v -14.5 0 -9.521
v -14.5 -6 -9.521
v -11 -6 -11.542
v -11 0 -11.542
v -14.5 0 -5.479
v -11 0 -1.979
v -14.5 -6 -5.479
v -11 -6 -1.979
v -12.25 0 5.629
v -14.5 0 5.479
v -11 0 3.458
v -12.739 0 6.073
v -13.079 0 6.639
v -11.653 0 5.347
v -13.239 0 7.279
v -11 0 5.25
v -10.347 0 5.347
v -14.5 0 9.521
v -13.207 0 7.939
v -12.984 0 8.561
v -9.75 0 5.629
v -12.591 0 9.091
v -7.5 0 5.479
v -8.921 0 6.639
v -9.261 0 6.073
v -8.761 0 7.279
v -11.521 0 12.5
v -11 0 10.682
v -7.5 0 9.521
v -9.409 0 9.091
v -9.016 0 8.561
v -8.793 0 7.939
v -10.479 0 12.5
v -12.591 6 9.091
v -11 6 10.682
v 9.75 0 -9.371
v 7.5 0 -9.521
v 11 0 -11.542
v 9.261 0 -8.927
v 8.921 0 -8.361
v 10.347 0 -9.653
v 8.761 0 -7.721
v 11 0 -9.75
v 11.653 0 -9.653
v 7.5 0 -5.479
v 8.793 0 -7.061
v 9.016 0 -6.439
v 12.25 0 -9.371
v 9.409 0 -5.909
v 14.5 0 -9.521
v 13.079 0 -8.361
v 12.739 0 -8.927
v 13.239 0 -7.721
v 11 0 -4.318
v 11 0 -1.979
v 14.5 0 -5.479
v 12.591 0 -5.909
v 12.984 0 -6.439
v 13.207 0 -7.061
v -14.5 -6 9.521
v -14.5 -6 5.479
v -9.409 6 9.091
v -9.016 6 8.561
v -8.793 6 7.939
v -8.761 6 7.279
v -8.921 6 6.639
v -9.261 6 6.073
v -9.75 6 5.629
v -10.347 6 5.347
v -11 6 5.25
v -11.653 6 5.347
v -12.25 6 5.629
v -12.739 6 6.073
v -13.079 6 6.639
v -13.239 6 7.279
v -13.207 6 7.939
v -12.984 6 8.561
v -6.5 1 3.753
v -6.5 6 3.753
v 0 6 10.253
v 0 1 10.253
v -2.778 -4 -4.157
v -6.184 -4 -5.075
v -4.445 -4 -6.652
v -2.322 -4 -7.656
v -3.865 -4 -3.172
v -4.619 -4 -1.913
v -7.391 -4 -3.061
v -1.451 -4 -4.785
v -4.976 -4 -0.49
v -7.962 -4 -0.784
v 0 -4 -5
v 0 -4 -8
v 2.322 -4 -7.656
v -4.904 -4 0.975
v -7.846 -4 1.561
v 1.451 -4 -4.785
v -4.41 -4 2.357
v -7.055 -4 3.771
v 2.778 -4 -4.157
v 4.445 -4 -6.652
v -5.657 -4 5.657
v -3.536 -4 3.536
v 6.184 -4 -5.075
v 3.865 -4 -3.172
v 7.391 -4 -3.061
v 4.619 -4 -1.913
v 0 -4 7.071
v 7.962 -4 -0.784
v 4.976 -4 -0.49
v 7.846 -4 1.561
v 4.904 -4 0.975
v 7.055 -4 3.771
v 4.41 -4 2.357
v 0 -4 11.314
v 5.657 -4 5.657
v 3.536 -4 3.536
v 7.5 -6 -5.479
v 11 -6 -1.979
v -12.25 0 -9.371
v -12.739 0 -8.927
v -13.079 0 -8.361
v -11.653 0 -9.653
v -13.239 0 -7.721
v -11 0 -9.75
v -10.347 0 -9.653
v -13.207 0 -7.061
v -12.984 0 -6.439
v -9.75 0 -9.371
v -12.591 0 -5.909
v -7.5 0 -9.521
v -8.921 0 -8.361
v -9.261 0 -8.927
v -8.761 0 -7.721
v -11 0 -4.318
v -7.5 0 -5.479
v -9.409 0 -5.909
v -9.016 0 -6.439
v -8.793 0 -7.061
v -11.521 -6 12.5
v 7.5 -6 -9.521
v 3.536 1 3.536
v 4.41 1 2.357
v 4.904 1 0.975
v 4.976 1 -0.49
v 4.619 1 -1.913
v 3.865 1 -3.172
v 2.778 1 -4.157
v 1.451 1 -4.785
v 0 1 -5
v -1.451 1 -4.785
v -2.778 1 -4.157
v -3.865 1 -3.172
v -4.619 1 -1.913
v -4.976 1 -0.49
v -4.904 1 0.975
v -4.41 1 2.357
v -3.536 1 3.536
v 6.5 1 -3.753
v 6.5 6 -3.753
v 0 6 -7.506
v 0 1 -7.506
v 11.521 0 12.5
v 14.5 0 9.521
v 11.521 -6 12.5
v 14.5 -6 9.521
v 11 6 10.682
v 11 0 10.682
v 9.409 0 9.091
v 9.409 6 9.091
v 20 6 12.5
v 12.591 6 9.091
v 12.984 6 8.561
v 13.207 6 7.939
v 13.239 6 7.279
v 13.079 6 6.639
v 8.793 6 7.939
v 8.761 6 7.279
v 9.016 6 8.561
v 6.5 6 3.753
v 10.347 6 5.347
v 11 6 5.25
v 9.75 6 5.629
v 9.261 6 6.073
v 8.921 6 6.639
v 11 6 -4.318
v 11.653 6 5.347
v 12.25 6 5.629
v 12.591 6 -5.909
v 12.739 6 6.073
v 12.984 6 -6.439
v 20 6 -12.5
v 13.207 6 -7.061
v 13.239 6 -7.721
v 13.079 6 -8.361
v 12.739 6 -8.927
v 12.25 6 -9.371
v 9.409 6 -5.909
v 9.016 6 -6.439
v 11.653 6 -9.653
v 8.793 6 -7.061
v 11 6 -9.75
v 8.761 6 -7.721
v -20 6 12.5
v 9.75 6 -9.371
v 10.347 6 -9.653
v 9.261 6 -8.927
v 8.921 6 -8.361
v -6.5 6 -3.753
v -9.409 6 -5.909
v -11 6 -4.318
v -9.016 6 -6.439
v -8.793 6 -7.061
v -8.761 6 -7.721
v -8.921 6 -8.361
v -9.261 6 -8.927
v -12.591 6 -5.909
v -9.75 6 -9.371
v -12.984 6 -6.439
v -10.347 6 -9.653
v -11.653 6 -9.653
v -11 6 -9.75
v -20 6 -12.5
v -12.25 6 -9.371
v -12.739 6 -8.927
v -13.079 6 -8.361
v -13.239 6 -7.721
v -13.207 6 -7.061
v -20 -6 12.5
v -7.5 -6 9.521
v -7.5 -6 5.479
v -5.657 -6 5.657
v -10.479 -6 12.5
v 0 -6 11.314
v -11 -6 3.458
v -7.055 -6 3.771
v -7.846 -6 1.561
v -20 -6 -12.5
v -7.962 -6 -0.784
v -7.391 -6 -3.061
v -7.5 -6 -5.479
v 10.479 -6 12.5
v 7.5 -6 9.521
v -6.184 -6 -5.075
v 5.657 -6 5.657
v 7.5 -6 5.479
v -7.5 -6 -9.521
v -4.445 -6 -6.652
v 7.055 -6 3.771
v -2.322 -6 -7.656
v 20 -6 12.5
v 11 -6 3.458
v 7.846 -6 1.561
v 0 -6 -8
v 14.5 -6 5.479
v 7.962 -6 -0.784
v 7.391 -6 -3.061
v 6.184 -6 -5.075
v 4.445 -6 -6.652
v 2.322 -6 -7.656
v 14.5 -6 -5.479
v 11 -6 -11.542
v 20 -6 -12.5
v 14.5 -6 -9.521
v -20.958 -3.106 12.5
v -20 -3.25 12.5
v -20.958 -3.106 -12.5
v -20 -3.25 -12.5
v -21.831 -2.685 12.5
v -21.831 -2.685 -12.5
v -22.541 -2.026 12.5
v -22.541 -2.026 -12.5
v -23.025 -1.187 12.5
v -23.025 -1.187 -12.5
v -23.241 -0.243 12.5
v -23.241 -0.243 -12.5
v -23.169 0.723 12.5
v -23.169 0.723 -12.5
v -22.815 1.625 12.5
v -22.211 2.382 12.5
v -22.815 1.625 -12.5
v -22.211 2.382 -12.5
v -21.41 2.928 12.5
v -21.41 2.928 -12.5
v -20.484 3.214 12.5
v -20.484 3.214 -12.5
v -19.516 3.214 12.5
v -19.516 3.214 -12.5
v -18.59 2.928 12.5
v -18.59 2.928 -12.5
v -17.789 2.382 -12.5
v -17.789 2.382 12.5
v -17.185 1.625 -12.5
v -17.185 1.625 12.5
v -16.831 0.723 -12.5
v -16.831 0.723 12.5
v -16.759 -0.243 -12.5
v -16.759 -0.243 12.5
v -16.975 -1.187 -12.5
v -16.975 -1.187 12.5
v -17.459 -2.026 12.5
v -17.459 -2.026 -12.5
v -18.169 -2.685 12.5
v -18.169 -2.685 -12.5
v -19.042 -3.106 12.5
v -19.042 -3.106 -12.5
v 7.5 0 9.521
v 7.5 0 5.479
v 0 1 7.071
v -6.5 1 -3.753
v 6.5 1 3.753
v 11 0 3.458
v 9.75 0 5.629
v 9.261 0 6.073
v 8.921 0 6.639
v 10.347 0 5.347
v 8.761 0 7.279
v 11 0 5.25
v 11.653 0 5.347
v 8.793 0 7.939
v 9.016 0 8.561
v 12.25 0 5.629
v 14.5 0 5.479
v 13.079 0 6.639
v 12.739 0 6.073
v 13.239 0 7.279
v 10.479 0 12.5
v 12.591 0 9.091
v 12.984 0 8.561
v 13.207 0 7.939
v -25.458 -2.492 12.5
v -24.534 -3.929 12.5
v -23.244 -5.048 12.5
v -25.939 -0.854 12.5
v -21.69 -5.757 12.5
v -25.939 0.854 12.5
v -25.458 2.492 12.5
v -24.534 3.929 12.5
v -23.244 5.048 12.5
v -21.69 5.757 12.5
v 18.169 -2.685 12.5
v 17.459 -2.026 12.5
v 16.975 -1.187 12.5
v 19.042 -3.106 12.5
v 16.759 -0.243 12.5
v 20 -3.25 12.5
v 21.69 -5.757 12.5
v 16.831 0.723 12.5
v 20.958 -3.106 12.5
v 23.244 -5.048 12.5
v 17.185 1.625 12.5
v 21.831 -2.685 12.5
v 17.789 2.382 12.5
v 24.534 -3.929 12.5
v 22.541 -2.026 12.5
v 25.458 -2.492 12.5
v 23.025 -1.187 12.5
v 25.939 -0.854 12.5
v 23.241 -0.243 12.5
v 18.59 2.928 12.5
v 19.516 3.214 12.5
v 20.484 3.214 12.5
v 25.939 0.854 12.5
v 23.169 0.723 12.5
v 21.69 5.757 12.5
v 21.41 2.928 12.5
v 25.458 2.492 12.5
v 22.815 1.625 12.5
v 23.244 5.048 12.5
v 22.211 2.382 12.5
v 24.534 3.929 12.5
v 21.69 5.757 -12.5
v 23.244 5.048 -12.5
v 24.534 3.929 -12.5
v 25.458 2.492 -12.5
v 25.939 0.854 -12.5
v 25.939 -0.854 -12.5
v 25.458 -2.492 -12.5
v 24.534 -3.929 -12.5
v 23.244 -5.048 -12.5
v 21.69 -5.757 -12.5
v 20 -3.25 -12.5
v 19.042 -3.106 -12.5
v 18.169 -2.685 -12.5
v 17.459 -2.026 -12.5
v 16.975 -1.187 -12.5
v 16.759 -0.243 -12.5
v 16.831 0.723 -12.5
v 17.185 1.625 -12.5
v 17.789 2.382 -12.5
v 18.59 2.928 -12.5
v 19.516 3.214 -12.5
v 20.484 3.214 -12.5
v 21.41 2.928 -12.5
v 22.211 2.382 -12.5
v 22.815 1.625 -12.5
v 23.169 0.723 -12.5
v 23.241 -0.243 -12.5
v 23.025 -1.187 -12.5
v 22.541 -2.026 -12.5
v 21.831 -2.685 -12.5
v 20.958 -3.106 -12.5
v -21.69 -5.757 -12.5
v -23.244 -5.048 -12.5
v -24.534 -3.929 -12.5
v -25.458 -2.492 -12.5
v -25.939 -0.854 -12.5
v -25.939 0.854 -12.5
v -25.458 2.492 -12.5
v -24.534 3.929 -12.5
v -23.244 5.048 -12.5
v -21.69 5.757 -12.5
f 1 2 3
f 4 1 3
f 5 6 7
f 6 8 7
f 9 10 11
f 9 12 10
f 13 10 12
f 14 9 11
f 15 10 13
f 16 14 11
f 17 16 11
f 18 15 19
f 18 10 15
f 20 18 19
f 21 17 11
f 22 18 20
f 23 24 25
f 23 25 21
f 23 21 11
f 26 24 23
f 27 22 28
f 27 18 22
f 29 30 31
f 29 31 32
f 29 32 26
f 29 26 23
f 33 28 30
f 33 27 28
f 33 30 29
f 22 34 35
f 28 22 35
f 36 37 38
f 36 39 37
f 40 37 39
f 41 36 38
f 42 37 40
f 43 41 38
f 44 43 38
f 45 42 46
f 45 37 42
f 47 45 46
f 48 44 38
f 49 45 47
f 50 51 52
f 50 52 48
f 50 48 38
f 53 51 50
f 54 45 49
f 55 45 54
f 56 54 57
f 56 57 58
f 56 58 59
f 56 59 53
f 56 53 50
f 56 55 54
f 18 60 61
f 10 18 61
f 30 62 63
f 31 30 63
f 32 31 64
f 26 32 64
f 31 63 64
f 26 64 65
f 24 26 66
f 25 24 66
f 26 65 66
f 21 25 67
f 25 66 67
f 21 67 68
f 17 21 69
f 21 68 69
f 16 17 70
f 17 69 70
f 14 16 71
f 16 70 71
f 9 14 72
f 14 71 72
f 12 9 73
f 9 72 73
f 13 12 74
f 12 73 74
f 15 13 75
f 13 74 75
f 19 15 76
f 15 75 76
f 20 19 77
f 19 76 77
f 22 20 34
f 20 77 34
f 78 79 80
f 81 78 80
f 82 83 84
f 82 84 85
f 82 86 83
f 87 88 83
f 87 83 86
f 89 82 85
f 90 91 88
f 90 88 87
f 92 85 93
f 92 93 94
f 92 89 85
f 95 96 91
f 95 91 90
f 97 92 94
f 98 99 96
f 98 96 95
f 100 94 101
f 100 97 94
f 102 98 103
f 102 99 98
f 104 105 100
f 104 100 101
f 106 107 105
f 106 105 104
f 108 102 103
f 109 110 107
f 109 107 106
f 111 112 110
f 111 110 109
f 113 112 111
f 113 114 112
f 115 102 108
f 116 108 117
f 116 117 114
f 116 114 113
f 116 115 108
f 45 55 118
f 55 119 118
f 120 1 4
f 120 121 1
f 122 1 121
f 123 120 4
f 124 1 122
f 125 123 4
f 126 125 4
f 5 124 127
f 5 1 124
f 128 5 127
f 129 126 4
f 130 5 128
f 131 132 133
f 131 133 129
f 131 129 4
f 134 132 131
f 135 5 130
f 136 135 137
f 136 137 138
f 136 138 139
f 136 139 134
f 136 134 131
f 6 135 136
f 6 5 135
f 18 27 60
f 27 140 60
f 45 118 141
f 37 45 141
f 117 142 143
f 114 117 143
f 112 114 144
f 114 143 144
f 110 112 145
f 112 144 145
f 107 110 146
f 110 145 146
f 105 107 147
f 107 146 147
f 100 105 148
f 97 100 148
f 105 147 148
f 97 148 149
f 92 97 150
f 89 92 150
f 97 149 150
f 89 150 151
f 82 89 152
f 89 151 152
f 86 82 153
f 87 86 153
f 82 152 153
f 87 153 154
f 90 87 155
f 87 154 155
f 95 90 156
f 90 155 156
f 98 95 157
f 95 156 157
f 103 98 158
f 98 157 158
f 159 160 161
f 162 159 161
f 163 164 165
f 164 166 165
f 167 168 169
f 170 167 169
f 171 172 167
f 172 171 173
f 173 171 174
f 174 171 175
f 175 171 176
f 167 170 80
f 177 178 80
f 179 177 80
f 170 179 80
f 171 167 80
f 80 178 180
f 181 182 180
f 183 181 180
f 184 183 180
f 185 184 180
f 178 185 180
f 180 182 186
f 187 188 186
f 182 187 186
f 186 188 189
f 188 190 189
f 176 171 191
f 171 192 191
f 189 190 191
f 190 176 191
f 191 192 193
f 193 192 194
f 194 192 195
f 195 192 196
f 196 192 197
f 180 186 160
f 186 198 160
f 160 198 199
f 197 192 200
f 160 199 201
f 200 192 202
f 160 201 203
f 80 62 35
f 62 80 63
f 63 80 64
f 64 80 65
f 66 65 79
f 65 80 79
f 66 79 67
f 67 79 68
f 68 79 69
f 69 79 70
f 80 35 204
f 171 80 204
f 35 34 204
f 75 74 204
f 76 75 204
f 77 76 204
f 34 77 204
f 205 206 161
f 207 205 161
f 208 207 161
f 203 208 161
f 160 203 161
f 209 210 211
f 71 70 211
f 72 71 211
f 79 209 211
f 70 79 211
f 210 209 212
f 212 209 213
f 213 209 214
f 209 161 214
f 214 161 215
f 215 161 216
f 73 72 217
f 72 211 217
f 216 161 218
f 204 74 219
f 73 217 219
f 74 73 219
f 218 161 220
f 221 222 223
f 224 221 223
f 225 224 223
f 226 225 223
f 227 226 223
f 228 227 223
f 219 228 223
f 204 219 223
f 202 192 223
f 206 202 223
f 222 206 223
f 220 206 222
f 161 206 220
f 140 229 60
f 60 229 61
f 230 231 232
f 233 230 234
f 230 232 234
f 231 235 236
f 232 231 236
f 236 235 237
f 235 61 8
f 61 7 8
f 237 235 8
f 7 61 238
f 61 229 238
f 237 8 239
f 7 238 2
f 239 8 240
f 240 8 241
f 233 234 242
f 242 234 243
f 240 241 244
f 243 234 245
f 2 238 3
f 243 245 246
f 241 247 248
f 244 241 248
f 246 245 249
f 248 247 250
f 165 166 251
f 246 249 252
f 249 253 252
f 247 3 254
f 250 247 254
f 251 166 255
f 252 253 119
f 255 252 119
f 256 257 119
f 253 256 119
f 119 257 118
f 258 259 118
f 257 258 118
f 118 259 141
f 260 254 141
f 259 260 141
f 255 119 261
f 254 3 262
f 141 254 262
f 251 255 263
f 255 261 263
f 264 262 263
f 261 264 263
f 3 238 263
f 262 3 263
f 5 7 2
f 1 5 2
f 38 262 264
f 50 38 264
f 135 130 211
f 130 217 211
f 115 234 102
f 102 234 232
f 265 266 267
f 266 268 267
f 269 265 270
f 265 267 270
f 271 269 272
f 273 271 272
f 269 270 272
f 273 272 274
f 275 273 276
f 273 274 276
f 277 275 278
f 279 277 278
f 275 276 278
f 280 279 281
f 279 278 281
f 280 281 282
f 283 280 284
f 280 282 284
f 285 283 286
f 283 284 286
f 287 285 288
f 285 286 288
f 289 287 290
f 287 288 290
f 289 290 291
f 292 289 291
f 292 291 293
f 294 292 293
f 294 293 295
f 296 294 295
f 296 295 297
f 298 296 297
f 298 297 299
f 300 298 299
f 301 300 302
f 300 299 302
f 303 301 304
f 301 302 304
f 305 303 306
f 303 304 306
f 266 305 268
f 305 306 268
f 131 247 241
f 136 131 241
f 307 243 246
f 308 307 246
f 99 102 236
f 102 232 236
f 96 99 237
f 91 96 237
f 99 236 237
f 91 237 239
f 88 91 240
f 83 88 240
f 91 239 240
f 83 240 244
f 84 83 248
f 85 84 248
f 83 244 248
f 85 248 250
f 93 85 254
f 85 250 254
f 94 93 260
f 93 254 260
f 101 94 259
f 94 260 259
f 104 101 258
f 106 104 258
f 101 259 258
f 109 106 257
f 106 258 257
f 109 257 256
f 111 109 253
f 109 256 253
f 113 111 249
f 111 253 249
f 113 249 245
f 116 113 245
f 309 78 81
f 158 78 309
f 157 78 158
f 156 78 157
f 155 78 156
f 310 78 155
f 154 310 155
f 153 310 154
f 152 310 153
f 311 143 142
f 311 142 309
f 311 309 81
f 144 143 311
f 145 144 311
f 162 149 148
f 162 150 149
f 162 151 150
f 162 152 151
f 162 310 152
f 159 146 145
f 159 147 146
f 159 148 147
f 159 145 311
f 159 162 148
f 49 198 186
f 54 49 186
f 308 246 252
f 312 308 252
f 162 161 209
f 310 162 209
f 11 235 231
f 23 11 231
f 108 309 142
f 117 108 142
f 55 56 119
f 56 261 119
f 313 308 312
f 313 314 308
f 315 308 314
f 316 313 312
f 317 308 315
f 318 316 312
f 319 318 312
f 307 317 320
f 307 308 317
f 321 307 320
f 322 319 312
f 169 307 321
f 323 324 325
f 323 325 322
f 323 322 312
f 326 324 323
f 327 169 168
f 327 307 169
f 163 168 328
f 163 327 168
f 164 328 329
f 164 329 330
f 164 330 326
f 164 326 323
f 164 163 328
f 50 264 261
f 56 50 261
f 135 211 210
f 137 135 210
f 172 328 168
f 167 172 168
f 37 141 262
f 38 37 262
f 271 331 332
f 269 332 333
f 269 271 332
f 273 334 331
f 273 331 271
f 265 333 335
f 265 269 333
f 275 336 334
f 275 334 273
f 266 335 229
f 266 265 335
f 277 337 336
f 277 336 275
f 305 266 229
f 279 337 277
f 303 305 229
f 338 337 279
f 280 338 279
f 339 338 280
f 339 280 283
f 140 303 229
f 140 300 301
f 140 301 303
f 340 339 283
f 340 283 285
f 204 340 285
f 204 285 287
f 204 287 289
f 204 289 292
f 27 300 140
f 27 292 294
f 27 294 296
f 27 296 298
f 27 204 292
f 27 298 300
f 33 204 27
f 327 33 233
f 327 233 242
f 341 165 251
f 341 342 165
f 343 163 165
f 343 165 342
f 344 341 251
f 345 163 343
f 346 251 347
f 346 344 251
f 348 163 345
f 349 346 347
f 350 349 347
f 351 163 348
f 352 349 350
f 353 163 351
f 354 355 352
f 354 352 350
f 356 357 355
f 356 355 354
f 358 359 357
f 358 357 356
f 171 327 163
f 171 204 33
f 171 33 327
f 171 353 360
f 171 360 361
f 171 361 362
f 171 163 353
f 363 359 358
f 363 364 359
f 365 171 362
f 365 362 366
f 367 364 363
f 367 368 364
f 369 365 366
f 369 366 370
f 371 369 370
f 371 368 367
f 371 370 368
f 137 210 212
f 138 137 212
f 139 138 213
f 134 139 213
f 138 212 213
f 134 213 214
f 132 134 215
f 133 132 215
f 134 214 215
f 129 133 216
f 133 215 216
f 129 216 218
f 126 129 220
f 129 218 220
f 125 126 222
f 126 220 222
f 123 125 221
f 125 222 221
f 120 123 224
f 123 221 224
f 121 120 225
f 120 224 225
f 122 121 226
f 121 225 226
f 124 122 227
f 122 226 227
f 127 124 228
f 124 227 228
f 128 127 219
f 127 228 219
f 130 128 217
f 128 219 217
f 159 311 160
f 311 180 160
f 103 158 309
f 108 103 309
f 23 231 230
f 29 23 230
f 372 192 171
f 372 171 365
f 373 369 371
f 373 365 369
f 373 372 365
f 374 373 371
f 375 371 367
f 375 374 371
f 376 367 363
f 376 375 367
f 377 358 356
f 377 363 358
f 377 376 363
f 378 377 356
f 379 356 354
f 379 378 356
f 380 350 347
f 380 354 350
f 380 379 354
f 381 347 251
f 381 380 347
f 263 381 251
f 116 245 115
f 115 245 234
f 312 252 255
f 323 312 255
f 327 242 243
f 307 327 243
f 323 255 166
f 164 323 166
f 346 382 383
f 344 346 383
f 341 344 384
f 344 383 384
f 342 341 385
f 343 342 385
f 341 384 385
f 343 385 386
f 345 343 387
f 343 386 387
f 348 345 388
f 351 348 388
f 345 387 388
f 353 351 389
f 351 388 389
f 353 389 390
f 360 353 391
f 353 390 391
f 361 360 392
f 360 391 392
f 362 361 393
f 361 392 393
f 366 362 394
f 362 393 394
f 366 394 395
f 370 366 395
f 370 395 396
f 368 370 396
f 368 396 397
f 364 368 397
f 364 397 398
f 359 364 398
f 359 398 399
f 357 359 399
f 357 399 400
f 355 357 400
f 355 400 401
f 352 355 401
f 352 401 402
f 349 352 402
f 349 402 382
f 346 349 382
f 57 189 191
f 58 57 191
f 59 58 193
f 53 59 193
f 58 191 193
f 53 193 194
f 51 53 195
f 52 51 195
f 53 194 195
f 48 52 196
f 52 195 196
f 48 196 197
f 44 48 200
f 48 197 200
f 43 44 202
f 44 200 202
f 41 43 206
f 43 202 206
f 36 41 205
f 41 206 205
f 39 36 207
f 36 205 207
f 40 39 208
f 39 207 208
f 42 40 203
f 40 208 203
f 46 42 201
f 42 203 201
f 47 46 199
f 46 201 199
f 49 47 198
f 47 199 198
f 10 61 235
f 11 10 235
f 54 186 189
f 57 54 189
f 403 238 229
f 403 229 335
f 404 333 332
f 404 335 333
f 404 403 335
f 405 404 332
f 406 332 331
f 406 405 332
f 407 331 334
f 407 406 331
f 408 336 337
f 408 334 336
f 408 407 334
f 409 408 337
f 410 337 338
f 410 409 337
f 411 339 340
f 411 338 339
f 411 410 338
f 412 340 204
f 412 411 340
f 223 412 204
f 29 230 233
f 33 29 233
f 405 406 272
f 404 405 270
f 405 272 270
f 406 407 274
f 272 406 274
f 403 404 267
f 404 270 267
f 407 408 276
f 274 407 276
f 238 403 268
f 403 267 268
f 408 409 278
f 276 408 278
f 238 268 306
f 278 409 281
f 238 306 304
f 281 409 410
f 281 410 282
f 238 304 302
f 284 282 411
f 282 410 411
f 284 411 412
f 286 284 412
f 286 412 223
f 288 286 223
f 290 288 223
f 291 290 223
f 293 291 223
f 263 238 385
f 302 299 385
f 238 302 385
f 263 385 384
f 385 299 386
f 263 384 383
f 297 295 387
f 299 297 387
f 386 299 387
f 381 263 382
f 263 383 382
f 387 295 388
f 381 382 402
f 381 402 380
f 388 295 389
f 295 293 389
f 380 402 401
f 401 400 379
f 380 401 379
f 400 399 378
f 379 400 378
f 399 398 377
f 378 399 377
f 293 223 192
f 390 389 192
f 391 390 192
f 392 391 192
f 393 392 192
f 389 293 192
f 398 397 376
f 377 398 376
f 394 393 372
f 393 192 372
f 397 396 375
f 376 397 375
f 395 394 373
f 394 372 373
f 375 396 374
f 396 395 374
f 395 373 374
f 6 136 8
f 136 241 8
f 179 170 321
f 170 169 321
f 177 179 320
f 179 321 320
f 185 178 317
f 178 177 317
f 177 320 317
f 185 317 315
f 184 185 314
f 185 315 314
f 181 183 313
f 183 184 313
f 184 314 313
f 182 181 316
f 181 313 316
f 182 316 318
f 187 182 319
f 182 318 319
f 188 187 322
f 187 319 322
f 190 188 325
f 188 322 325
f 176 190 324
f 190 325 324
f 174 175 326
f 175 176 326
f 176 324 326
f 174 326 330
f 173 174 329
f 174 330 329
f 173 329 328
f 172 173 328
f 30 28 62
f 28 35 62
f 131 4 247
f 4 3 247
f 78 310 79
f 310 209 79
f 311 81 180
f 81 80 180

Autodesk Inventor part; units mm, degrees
ref_plane "YZ Plane" through (0, 0, 0) normal (1, 0, 0) x (0, 1, 0)
ref_plane "XZ Plane" through (0, 0, 0) normal (0, 1, 0) x (-1, 0, 0)
ref_plane "Work Plane1" through (0, 0, -12.5) normal (0, 0, 1) x (1, 0, 0)
sketch "Sketch1" plane through (0, 0, -12.5) normal (0, 0, 1) x (1, 0, 0)
  arc A0 (20, -6) -> (20, 6) centre (20, 0) ccw
  line L0 (20, 6) -> (-20, 6)
  arc A1 (-20, 6) -> (-20, -6) centre (-20, 0) ccw
  line L1 (-20, -6) -> (20, -6)
extrude "Extrusion12" add sketch "Sketch1" along normal blind 25
sketch "Sketch2" plane through (-20, -6, -12.5) normal (0, -1, 0) x (1, 0, 0)
  line L0 (31, 10.5207) -> (27.5, 7.0207)
  line L1 (34.5, 7.0207) -> (31, 10.5207)
  line L2 (34.5, 2.9793) -> (34.5, 7.0207)
  line L3 (31, 0.9585) -> (34.5, 2.9793)
  line L4 (27.5, 2.9793) -> (31, 0.9585)
  line L5 (27.5, 7.0207) -> (27.5, 2.9793)
extrude "Extrusion11" cut sketch "Sketch2" against normal blind 6 draft 0
sketch "Sketch3" plane through (-20, -6, -12.5) normal (0, -1, 0) x (1, 0, 0)
  line L0 (9, 10.5207) -> (5.5, 7.0207)
  line L1 (12.5, 7.0207) -> (9, 10.5207)
  line L2 (12.5, 2.9793) -> (12.5, 7.0207)
  line L3 (9, 0.9585) -> (12.5, 2.9793)
  line L4 (5.5, 2.9793) -> (9, 0.9585)
  line L5 (5.5, 7.0207) -> (5.5, 2.9793)
extrude "Extrusion10" cut sketch "Sketch3" against normal blind 6 draft 0
sketch "Sketch4" plane through (-20, -6, -12.5) normal (0, -1, 0) x (1, 0, 0)
  line L0 (5.5, 22.0207) -> (5.5, 17.9793)
  line L1 (8.4793, 25) -> (9.5207, 25)
  line L2 (9, 15.9585) -> (12.5, 17.9793)
  line L3 (8.4793, 25) -> (5.5, 22.0207)
  line L4 (12.5, 22.0207) -> (9.5207, 25)
  line L5 (5.5, 17.9793) -> (9, 15.9585)
  line L6 (12.5, 17.9793) -> (12.5, 22.0207)
extrude "Extrusion9" cut sketch "Sketch4" against normal blind 6 draft 0
sketch "Sketch5" plane through (-20, -6, -12.5) normal (0, -1, 0) x (1, 0, 0)
  line L0 (31, 15.9585) -> (34.5, 17.9793)
  line L1 (30.4793, 25) -> (27.5, 22.0207)
  line L2 (34.5, 22.0207) -> (31.5207, 25)
  line L3 (27.5, 17.9793) -> (31, 15.9585)
  line L4 (31.5207, 25) -> (30.4793, 25)
  line L5 (34.5, 17.9793) -> (34.5, 22.0207)
  line L6 (27.5, 22.0207) -> (27.5, 17.9793)
extrude "Extrusion8" cut sketch "Sketch5" against normal blind 6
sketch "Sketch6" plane through (0, 0, 0) normal (0, 1, 0) x (-1, 0, 0)
  arc A0 (-12.591, 9.091) -> (-9.409, 9.091) centre (-11, 7.5) ccw
  line L0 (-12.591, 9.091) -> (-11, 10.682)
  line L1 (-11, 10.682) -> (-9.409, 9.091)
extrude "Extrusion7" cut sketch "Sketch6" along normal blind 6 draft 0
sketch "Sketch7" plane through (-20, 6, -12.5) normal (0, 1, 0) x (1, 0, 0)
  line L0 (7.409, -21.591) -> (9, -23.182)
  arc A0 (10.591, -21.591) -> (7.409, -21.591) centre (9, -20) ccw
  line L1 (9, -23.182) -> (10.591, -21.591)
extrude "Extrusion6" cut sketch "Sketch7" against normal blind 6
sketch "Sketch8" plane through (-20, 6, -12.5) normal (0, 1, 0) x (1, 0, 0)
  arc A0 (32.591, -6.591) -> (29.409, -6.591) centre (31, -5) ccw
  line L0 (31, -8.182) -> (32.591, -6.591)
  line L1 (29.409, -6.591) -> (31, -8.182)
extrude "Extrusion5" cut sketch "Sketch8" against normal blind 6
sketch "Sketch9" plane through (-20, 6, -12.5) normal (0, 1, 0) x (1, 0, 0)
  arc A0 (10.591, -6.591) -> (7.409, -6.591) centre (9, -5) ccw
  line L0 (9, -8.182) -> (10.591, -6.591)
  line L1 (7.409, -6.591) -> (9, -8.182)
extrude "Extrusion4" cut sketch "Sketch9" against normal blind 6
sketch "Sketch10" plane through (-20, 6, -12.5) normal (0, 1, 0) x (1, 0, 0)
  line L0 (20, -22.7528) -> (26.5, -16.2528)
  line L1 (13.5, -16.2528) -> (20, -22.7528)
  line L2 (13.5, -8.7472) -> (13.5, -16.2528)
  line L3 (20, -4.9944) -> (13.5, -8.7472)
  line L4 (26.5, -8.7472) -> (20, -4.9944)
  line L5 (26.5, -16.2528) -> (26.5, -8.7472)
extrude "Extrusion3" cut sketch "Sketch10" against normal blind 5 draft 0
sketch "Sketch11" plane through (-20, -6, -12.5) normal (0, -1, 0) x (1, 0, 0)
  line L0 (20, 23.8137) -> (14.3431, 18.1569)
  line L1 (25.6569, 18.1569) -> (20, 23.8137)
  arc A0 (14.3431, 18.1569) -> (25.6569, 18.1569) centre (20, 12.5) ccw
extrude "Extrusion2" cut sketch "Sketch11" against normal blind 2 draft 0
sketch "Sketch12" plane through (-20, 1, -12.5) normal (0, 1, 0) x (1, 0, 0)
  arc A0 (23.5355, -16.0355) -> (16.4645, -16.0355) centre (20, -12.5) ccw
  line L0 (20, -19.5711) -> (23.5355, -16.0355)
  line L1 (16.4645, -16.0355) -> (20, -19.5711)
extrude "Extrusion1" cut sketch "Sketch12" against normal blind 5
hole "Hole2" at (20, 0, 12.5) direction (0, 0, -1) diameter 6.5 depth 25
sketch "Sketch13" plane through (0, 0, 12.5) normal (0, 0, 1) x (1, 0, 0)
  point P0 (20, 0)
hole "Hole1" at (-20, 0, 12.5) direction (0, 0, -1) diameter 6.5 depth 25
sketch "Sketch14" plane through (0, 0, 12.5) normal (0, 0, 1) x (1, 0, 0)
  point P0 (-20, 0)
properties part number "Hopper Nut Trap" material "ASA Plastic"
